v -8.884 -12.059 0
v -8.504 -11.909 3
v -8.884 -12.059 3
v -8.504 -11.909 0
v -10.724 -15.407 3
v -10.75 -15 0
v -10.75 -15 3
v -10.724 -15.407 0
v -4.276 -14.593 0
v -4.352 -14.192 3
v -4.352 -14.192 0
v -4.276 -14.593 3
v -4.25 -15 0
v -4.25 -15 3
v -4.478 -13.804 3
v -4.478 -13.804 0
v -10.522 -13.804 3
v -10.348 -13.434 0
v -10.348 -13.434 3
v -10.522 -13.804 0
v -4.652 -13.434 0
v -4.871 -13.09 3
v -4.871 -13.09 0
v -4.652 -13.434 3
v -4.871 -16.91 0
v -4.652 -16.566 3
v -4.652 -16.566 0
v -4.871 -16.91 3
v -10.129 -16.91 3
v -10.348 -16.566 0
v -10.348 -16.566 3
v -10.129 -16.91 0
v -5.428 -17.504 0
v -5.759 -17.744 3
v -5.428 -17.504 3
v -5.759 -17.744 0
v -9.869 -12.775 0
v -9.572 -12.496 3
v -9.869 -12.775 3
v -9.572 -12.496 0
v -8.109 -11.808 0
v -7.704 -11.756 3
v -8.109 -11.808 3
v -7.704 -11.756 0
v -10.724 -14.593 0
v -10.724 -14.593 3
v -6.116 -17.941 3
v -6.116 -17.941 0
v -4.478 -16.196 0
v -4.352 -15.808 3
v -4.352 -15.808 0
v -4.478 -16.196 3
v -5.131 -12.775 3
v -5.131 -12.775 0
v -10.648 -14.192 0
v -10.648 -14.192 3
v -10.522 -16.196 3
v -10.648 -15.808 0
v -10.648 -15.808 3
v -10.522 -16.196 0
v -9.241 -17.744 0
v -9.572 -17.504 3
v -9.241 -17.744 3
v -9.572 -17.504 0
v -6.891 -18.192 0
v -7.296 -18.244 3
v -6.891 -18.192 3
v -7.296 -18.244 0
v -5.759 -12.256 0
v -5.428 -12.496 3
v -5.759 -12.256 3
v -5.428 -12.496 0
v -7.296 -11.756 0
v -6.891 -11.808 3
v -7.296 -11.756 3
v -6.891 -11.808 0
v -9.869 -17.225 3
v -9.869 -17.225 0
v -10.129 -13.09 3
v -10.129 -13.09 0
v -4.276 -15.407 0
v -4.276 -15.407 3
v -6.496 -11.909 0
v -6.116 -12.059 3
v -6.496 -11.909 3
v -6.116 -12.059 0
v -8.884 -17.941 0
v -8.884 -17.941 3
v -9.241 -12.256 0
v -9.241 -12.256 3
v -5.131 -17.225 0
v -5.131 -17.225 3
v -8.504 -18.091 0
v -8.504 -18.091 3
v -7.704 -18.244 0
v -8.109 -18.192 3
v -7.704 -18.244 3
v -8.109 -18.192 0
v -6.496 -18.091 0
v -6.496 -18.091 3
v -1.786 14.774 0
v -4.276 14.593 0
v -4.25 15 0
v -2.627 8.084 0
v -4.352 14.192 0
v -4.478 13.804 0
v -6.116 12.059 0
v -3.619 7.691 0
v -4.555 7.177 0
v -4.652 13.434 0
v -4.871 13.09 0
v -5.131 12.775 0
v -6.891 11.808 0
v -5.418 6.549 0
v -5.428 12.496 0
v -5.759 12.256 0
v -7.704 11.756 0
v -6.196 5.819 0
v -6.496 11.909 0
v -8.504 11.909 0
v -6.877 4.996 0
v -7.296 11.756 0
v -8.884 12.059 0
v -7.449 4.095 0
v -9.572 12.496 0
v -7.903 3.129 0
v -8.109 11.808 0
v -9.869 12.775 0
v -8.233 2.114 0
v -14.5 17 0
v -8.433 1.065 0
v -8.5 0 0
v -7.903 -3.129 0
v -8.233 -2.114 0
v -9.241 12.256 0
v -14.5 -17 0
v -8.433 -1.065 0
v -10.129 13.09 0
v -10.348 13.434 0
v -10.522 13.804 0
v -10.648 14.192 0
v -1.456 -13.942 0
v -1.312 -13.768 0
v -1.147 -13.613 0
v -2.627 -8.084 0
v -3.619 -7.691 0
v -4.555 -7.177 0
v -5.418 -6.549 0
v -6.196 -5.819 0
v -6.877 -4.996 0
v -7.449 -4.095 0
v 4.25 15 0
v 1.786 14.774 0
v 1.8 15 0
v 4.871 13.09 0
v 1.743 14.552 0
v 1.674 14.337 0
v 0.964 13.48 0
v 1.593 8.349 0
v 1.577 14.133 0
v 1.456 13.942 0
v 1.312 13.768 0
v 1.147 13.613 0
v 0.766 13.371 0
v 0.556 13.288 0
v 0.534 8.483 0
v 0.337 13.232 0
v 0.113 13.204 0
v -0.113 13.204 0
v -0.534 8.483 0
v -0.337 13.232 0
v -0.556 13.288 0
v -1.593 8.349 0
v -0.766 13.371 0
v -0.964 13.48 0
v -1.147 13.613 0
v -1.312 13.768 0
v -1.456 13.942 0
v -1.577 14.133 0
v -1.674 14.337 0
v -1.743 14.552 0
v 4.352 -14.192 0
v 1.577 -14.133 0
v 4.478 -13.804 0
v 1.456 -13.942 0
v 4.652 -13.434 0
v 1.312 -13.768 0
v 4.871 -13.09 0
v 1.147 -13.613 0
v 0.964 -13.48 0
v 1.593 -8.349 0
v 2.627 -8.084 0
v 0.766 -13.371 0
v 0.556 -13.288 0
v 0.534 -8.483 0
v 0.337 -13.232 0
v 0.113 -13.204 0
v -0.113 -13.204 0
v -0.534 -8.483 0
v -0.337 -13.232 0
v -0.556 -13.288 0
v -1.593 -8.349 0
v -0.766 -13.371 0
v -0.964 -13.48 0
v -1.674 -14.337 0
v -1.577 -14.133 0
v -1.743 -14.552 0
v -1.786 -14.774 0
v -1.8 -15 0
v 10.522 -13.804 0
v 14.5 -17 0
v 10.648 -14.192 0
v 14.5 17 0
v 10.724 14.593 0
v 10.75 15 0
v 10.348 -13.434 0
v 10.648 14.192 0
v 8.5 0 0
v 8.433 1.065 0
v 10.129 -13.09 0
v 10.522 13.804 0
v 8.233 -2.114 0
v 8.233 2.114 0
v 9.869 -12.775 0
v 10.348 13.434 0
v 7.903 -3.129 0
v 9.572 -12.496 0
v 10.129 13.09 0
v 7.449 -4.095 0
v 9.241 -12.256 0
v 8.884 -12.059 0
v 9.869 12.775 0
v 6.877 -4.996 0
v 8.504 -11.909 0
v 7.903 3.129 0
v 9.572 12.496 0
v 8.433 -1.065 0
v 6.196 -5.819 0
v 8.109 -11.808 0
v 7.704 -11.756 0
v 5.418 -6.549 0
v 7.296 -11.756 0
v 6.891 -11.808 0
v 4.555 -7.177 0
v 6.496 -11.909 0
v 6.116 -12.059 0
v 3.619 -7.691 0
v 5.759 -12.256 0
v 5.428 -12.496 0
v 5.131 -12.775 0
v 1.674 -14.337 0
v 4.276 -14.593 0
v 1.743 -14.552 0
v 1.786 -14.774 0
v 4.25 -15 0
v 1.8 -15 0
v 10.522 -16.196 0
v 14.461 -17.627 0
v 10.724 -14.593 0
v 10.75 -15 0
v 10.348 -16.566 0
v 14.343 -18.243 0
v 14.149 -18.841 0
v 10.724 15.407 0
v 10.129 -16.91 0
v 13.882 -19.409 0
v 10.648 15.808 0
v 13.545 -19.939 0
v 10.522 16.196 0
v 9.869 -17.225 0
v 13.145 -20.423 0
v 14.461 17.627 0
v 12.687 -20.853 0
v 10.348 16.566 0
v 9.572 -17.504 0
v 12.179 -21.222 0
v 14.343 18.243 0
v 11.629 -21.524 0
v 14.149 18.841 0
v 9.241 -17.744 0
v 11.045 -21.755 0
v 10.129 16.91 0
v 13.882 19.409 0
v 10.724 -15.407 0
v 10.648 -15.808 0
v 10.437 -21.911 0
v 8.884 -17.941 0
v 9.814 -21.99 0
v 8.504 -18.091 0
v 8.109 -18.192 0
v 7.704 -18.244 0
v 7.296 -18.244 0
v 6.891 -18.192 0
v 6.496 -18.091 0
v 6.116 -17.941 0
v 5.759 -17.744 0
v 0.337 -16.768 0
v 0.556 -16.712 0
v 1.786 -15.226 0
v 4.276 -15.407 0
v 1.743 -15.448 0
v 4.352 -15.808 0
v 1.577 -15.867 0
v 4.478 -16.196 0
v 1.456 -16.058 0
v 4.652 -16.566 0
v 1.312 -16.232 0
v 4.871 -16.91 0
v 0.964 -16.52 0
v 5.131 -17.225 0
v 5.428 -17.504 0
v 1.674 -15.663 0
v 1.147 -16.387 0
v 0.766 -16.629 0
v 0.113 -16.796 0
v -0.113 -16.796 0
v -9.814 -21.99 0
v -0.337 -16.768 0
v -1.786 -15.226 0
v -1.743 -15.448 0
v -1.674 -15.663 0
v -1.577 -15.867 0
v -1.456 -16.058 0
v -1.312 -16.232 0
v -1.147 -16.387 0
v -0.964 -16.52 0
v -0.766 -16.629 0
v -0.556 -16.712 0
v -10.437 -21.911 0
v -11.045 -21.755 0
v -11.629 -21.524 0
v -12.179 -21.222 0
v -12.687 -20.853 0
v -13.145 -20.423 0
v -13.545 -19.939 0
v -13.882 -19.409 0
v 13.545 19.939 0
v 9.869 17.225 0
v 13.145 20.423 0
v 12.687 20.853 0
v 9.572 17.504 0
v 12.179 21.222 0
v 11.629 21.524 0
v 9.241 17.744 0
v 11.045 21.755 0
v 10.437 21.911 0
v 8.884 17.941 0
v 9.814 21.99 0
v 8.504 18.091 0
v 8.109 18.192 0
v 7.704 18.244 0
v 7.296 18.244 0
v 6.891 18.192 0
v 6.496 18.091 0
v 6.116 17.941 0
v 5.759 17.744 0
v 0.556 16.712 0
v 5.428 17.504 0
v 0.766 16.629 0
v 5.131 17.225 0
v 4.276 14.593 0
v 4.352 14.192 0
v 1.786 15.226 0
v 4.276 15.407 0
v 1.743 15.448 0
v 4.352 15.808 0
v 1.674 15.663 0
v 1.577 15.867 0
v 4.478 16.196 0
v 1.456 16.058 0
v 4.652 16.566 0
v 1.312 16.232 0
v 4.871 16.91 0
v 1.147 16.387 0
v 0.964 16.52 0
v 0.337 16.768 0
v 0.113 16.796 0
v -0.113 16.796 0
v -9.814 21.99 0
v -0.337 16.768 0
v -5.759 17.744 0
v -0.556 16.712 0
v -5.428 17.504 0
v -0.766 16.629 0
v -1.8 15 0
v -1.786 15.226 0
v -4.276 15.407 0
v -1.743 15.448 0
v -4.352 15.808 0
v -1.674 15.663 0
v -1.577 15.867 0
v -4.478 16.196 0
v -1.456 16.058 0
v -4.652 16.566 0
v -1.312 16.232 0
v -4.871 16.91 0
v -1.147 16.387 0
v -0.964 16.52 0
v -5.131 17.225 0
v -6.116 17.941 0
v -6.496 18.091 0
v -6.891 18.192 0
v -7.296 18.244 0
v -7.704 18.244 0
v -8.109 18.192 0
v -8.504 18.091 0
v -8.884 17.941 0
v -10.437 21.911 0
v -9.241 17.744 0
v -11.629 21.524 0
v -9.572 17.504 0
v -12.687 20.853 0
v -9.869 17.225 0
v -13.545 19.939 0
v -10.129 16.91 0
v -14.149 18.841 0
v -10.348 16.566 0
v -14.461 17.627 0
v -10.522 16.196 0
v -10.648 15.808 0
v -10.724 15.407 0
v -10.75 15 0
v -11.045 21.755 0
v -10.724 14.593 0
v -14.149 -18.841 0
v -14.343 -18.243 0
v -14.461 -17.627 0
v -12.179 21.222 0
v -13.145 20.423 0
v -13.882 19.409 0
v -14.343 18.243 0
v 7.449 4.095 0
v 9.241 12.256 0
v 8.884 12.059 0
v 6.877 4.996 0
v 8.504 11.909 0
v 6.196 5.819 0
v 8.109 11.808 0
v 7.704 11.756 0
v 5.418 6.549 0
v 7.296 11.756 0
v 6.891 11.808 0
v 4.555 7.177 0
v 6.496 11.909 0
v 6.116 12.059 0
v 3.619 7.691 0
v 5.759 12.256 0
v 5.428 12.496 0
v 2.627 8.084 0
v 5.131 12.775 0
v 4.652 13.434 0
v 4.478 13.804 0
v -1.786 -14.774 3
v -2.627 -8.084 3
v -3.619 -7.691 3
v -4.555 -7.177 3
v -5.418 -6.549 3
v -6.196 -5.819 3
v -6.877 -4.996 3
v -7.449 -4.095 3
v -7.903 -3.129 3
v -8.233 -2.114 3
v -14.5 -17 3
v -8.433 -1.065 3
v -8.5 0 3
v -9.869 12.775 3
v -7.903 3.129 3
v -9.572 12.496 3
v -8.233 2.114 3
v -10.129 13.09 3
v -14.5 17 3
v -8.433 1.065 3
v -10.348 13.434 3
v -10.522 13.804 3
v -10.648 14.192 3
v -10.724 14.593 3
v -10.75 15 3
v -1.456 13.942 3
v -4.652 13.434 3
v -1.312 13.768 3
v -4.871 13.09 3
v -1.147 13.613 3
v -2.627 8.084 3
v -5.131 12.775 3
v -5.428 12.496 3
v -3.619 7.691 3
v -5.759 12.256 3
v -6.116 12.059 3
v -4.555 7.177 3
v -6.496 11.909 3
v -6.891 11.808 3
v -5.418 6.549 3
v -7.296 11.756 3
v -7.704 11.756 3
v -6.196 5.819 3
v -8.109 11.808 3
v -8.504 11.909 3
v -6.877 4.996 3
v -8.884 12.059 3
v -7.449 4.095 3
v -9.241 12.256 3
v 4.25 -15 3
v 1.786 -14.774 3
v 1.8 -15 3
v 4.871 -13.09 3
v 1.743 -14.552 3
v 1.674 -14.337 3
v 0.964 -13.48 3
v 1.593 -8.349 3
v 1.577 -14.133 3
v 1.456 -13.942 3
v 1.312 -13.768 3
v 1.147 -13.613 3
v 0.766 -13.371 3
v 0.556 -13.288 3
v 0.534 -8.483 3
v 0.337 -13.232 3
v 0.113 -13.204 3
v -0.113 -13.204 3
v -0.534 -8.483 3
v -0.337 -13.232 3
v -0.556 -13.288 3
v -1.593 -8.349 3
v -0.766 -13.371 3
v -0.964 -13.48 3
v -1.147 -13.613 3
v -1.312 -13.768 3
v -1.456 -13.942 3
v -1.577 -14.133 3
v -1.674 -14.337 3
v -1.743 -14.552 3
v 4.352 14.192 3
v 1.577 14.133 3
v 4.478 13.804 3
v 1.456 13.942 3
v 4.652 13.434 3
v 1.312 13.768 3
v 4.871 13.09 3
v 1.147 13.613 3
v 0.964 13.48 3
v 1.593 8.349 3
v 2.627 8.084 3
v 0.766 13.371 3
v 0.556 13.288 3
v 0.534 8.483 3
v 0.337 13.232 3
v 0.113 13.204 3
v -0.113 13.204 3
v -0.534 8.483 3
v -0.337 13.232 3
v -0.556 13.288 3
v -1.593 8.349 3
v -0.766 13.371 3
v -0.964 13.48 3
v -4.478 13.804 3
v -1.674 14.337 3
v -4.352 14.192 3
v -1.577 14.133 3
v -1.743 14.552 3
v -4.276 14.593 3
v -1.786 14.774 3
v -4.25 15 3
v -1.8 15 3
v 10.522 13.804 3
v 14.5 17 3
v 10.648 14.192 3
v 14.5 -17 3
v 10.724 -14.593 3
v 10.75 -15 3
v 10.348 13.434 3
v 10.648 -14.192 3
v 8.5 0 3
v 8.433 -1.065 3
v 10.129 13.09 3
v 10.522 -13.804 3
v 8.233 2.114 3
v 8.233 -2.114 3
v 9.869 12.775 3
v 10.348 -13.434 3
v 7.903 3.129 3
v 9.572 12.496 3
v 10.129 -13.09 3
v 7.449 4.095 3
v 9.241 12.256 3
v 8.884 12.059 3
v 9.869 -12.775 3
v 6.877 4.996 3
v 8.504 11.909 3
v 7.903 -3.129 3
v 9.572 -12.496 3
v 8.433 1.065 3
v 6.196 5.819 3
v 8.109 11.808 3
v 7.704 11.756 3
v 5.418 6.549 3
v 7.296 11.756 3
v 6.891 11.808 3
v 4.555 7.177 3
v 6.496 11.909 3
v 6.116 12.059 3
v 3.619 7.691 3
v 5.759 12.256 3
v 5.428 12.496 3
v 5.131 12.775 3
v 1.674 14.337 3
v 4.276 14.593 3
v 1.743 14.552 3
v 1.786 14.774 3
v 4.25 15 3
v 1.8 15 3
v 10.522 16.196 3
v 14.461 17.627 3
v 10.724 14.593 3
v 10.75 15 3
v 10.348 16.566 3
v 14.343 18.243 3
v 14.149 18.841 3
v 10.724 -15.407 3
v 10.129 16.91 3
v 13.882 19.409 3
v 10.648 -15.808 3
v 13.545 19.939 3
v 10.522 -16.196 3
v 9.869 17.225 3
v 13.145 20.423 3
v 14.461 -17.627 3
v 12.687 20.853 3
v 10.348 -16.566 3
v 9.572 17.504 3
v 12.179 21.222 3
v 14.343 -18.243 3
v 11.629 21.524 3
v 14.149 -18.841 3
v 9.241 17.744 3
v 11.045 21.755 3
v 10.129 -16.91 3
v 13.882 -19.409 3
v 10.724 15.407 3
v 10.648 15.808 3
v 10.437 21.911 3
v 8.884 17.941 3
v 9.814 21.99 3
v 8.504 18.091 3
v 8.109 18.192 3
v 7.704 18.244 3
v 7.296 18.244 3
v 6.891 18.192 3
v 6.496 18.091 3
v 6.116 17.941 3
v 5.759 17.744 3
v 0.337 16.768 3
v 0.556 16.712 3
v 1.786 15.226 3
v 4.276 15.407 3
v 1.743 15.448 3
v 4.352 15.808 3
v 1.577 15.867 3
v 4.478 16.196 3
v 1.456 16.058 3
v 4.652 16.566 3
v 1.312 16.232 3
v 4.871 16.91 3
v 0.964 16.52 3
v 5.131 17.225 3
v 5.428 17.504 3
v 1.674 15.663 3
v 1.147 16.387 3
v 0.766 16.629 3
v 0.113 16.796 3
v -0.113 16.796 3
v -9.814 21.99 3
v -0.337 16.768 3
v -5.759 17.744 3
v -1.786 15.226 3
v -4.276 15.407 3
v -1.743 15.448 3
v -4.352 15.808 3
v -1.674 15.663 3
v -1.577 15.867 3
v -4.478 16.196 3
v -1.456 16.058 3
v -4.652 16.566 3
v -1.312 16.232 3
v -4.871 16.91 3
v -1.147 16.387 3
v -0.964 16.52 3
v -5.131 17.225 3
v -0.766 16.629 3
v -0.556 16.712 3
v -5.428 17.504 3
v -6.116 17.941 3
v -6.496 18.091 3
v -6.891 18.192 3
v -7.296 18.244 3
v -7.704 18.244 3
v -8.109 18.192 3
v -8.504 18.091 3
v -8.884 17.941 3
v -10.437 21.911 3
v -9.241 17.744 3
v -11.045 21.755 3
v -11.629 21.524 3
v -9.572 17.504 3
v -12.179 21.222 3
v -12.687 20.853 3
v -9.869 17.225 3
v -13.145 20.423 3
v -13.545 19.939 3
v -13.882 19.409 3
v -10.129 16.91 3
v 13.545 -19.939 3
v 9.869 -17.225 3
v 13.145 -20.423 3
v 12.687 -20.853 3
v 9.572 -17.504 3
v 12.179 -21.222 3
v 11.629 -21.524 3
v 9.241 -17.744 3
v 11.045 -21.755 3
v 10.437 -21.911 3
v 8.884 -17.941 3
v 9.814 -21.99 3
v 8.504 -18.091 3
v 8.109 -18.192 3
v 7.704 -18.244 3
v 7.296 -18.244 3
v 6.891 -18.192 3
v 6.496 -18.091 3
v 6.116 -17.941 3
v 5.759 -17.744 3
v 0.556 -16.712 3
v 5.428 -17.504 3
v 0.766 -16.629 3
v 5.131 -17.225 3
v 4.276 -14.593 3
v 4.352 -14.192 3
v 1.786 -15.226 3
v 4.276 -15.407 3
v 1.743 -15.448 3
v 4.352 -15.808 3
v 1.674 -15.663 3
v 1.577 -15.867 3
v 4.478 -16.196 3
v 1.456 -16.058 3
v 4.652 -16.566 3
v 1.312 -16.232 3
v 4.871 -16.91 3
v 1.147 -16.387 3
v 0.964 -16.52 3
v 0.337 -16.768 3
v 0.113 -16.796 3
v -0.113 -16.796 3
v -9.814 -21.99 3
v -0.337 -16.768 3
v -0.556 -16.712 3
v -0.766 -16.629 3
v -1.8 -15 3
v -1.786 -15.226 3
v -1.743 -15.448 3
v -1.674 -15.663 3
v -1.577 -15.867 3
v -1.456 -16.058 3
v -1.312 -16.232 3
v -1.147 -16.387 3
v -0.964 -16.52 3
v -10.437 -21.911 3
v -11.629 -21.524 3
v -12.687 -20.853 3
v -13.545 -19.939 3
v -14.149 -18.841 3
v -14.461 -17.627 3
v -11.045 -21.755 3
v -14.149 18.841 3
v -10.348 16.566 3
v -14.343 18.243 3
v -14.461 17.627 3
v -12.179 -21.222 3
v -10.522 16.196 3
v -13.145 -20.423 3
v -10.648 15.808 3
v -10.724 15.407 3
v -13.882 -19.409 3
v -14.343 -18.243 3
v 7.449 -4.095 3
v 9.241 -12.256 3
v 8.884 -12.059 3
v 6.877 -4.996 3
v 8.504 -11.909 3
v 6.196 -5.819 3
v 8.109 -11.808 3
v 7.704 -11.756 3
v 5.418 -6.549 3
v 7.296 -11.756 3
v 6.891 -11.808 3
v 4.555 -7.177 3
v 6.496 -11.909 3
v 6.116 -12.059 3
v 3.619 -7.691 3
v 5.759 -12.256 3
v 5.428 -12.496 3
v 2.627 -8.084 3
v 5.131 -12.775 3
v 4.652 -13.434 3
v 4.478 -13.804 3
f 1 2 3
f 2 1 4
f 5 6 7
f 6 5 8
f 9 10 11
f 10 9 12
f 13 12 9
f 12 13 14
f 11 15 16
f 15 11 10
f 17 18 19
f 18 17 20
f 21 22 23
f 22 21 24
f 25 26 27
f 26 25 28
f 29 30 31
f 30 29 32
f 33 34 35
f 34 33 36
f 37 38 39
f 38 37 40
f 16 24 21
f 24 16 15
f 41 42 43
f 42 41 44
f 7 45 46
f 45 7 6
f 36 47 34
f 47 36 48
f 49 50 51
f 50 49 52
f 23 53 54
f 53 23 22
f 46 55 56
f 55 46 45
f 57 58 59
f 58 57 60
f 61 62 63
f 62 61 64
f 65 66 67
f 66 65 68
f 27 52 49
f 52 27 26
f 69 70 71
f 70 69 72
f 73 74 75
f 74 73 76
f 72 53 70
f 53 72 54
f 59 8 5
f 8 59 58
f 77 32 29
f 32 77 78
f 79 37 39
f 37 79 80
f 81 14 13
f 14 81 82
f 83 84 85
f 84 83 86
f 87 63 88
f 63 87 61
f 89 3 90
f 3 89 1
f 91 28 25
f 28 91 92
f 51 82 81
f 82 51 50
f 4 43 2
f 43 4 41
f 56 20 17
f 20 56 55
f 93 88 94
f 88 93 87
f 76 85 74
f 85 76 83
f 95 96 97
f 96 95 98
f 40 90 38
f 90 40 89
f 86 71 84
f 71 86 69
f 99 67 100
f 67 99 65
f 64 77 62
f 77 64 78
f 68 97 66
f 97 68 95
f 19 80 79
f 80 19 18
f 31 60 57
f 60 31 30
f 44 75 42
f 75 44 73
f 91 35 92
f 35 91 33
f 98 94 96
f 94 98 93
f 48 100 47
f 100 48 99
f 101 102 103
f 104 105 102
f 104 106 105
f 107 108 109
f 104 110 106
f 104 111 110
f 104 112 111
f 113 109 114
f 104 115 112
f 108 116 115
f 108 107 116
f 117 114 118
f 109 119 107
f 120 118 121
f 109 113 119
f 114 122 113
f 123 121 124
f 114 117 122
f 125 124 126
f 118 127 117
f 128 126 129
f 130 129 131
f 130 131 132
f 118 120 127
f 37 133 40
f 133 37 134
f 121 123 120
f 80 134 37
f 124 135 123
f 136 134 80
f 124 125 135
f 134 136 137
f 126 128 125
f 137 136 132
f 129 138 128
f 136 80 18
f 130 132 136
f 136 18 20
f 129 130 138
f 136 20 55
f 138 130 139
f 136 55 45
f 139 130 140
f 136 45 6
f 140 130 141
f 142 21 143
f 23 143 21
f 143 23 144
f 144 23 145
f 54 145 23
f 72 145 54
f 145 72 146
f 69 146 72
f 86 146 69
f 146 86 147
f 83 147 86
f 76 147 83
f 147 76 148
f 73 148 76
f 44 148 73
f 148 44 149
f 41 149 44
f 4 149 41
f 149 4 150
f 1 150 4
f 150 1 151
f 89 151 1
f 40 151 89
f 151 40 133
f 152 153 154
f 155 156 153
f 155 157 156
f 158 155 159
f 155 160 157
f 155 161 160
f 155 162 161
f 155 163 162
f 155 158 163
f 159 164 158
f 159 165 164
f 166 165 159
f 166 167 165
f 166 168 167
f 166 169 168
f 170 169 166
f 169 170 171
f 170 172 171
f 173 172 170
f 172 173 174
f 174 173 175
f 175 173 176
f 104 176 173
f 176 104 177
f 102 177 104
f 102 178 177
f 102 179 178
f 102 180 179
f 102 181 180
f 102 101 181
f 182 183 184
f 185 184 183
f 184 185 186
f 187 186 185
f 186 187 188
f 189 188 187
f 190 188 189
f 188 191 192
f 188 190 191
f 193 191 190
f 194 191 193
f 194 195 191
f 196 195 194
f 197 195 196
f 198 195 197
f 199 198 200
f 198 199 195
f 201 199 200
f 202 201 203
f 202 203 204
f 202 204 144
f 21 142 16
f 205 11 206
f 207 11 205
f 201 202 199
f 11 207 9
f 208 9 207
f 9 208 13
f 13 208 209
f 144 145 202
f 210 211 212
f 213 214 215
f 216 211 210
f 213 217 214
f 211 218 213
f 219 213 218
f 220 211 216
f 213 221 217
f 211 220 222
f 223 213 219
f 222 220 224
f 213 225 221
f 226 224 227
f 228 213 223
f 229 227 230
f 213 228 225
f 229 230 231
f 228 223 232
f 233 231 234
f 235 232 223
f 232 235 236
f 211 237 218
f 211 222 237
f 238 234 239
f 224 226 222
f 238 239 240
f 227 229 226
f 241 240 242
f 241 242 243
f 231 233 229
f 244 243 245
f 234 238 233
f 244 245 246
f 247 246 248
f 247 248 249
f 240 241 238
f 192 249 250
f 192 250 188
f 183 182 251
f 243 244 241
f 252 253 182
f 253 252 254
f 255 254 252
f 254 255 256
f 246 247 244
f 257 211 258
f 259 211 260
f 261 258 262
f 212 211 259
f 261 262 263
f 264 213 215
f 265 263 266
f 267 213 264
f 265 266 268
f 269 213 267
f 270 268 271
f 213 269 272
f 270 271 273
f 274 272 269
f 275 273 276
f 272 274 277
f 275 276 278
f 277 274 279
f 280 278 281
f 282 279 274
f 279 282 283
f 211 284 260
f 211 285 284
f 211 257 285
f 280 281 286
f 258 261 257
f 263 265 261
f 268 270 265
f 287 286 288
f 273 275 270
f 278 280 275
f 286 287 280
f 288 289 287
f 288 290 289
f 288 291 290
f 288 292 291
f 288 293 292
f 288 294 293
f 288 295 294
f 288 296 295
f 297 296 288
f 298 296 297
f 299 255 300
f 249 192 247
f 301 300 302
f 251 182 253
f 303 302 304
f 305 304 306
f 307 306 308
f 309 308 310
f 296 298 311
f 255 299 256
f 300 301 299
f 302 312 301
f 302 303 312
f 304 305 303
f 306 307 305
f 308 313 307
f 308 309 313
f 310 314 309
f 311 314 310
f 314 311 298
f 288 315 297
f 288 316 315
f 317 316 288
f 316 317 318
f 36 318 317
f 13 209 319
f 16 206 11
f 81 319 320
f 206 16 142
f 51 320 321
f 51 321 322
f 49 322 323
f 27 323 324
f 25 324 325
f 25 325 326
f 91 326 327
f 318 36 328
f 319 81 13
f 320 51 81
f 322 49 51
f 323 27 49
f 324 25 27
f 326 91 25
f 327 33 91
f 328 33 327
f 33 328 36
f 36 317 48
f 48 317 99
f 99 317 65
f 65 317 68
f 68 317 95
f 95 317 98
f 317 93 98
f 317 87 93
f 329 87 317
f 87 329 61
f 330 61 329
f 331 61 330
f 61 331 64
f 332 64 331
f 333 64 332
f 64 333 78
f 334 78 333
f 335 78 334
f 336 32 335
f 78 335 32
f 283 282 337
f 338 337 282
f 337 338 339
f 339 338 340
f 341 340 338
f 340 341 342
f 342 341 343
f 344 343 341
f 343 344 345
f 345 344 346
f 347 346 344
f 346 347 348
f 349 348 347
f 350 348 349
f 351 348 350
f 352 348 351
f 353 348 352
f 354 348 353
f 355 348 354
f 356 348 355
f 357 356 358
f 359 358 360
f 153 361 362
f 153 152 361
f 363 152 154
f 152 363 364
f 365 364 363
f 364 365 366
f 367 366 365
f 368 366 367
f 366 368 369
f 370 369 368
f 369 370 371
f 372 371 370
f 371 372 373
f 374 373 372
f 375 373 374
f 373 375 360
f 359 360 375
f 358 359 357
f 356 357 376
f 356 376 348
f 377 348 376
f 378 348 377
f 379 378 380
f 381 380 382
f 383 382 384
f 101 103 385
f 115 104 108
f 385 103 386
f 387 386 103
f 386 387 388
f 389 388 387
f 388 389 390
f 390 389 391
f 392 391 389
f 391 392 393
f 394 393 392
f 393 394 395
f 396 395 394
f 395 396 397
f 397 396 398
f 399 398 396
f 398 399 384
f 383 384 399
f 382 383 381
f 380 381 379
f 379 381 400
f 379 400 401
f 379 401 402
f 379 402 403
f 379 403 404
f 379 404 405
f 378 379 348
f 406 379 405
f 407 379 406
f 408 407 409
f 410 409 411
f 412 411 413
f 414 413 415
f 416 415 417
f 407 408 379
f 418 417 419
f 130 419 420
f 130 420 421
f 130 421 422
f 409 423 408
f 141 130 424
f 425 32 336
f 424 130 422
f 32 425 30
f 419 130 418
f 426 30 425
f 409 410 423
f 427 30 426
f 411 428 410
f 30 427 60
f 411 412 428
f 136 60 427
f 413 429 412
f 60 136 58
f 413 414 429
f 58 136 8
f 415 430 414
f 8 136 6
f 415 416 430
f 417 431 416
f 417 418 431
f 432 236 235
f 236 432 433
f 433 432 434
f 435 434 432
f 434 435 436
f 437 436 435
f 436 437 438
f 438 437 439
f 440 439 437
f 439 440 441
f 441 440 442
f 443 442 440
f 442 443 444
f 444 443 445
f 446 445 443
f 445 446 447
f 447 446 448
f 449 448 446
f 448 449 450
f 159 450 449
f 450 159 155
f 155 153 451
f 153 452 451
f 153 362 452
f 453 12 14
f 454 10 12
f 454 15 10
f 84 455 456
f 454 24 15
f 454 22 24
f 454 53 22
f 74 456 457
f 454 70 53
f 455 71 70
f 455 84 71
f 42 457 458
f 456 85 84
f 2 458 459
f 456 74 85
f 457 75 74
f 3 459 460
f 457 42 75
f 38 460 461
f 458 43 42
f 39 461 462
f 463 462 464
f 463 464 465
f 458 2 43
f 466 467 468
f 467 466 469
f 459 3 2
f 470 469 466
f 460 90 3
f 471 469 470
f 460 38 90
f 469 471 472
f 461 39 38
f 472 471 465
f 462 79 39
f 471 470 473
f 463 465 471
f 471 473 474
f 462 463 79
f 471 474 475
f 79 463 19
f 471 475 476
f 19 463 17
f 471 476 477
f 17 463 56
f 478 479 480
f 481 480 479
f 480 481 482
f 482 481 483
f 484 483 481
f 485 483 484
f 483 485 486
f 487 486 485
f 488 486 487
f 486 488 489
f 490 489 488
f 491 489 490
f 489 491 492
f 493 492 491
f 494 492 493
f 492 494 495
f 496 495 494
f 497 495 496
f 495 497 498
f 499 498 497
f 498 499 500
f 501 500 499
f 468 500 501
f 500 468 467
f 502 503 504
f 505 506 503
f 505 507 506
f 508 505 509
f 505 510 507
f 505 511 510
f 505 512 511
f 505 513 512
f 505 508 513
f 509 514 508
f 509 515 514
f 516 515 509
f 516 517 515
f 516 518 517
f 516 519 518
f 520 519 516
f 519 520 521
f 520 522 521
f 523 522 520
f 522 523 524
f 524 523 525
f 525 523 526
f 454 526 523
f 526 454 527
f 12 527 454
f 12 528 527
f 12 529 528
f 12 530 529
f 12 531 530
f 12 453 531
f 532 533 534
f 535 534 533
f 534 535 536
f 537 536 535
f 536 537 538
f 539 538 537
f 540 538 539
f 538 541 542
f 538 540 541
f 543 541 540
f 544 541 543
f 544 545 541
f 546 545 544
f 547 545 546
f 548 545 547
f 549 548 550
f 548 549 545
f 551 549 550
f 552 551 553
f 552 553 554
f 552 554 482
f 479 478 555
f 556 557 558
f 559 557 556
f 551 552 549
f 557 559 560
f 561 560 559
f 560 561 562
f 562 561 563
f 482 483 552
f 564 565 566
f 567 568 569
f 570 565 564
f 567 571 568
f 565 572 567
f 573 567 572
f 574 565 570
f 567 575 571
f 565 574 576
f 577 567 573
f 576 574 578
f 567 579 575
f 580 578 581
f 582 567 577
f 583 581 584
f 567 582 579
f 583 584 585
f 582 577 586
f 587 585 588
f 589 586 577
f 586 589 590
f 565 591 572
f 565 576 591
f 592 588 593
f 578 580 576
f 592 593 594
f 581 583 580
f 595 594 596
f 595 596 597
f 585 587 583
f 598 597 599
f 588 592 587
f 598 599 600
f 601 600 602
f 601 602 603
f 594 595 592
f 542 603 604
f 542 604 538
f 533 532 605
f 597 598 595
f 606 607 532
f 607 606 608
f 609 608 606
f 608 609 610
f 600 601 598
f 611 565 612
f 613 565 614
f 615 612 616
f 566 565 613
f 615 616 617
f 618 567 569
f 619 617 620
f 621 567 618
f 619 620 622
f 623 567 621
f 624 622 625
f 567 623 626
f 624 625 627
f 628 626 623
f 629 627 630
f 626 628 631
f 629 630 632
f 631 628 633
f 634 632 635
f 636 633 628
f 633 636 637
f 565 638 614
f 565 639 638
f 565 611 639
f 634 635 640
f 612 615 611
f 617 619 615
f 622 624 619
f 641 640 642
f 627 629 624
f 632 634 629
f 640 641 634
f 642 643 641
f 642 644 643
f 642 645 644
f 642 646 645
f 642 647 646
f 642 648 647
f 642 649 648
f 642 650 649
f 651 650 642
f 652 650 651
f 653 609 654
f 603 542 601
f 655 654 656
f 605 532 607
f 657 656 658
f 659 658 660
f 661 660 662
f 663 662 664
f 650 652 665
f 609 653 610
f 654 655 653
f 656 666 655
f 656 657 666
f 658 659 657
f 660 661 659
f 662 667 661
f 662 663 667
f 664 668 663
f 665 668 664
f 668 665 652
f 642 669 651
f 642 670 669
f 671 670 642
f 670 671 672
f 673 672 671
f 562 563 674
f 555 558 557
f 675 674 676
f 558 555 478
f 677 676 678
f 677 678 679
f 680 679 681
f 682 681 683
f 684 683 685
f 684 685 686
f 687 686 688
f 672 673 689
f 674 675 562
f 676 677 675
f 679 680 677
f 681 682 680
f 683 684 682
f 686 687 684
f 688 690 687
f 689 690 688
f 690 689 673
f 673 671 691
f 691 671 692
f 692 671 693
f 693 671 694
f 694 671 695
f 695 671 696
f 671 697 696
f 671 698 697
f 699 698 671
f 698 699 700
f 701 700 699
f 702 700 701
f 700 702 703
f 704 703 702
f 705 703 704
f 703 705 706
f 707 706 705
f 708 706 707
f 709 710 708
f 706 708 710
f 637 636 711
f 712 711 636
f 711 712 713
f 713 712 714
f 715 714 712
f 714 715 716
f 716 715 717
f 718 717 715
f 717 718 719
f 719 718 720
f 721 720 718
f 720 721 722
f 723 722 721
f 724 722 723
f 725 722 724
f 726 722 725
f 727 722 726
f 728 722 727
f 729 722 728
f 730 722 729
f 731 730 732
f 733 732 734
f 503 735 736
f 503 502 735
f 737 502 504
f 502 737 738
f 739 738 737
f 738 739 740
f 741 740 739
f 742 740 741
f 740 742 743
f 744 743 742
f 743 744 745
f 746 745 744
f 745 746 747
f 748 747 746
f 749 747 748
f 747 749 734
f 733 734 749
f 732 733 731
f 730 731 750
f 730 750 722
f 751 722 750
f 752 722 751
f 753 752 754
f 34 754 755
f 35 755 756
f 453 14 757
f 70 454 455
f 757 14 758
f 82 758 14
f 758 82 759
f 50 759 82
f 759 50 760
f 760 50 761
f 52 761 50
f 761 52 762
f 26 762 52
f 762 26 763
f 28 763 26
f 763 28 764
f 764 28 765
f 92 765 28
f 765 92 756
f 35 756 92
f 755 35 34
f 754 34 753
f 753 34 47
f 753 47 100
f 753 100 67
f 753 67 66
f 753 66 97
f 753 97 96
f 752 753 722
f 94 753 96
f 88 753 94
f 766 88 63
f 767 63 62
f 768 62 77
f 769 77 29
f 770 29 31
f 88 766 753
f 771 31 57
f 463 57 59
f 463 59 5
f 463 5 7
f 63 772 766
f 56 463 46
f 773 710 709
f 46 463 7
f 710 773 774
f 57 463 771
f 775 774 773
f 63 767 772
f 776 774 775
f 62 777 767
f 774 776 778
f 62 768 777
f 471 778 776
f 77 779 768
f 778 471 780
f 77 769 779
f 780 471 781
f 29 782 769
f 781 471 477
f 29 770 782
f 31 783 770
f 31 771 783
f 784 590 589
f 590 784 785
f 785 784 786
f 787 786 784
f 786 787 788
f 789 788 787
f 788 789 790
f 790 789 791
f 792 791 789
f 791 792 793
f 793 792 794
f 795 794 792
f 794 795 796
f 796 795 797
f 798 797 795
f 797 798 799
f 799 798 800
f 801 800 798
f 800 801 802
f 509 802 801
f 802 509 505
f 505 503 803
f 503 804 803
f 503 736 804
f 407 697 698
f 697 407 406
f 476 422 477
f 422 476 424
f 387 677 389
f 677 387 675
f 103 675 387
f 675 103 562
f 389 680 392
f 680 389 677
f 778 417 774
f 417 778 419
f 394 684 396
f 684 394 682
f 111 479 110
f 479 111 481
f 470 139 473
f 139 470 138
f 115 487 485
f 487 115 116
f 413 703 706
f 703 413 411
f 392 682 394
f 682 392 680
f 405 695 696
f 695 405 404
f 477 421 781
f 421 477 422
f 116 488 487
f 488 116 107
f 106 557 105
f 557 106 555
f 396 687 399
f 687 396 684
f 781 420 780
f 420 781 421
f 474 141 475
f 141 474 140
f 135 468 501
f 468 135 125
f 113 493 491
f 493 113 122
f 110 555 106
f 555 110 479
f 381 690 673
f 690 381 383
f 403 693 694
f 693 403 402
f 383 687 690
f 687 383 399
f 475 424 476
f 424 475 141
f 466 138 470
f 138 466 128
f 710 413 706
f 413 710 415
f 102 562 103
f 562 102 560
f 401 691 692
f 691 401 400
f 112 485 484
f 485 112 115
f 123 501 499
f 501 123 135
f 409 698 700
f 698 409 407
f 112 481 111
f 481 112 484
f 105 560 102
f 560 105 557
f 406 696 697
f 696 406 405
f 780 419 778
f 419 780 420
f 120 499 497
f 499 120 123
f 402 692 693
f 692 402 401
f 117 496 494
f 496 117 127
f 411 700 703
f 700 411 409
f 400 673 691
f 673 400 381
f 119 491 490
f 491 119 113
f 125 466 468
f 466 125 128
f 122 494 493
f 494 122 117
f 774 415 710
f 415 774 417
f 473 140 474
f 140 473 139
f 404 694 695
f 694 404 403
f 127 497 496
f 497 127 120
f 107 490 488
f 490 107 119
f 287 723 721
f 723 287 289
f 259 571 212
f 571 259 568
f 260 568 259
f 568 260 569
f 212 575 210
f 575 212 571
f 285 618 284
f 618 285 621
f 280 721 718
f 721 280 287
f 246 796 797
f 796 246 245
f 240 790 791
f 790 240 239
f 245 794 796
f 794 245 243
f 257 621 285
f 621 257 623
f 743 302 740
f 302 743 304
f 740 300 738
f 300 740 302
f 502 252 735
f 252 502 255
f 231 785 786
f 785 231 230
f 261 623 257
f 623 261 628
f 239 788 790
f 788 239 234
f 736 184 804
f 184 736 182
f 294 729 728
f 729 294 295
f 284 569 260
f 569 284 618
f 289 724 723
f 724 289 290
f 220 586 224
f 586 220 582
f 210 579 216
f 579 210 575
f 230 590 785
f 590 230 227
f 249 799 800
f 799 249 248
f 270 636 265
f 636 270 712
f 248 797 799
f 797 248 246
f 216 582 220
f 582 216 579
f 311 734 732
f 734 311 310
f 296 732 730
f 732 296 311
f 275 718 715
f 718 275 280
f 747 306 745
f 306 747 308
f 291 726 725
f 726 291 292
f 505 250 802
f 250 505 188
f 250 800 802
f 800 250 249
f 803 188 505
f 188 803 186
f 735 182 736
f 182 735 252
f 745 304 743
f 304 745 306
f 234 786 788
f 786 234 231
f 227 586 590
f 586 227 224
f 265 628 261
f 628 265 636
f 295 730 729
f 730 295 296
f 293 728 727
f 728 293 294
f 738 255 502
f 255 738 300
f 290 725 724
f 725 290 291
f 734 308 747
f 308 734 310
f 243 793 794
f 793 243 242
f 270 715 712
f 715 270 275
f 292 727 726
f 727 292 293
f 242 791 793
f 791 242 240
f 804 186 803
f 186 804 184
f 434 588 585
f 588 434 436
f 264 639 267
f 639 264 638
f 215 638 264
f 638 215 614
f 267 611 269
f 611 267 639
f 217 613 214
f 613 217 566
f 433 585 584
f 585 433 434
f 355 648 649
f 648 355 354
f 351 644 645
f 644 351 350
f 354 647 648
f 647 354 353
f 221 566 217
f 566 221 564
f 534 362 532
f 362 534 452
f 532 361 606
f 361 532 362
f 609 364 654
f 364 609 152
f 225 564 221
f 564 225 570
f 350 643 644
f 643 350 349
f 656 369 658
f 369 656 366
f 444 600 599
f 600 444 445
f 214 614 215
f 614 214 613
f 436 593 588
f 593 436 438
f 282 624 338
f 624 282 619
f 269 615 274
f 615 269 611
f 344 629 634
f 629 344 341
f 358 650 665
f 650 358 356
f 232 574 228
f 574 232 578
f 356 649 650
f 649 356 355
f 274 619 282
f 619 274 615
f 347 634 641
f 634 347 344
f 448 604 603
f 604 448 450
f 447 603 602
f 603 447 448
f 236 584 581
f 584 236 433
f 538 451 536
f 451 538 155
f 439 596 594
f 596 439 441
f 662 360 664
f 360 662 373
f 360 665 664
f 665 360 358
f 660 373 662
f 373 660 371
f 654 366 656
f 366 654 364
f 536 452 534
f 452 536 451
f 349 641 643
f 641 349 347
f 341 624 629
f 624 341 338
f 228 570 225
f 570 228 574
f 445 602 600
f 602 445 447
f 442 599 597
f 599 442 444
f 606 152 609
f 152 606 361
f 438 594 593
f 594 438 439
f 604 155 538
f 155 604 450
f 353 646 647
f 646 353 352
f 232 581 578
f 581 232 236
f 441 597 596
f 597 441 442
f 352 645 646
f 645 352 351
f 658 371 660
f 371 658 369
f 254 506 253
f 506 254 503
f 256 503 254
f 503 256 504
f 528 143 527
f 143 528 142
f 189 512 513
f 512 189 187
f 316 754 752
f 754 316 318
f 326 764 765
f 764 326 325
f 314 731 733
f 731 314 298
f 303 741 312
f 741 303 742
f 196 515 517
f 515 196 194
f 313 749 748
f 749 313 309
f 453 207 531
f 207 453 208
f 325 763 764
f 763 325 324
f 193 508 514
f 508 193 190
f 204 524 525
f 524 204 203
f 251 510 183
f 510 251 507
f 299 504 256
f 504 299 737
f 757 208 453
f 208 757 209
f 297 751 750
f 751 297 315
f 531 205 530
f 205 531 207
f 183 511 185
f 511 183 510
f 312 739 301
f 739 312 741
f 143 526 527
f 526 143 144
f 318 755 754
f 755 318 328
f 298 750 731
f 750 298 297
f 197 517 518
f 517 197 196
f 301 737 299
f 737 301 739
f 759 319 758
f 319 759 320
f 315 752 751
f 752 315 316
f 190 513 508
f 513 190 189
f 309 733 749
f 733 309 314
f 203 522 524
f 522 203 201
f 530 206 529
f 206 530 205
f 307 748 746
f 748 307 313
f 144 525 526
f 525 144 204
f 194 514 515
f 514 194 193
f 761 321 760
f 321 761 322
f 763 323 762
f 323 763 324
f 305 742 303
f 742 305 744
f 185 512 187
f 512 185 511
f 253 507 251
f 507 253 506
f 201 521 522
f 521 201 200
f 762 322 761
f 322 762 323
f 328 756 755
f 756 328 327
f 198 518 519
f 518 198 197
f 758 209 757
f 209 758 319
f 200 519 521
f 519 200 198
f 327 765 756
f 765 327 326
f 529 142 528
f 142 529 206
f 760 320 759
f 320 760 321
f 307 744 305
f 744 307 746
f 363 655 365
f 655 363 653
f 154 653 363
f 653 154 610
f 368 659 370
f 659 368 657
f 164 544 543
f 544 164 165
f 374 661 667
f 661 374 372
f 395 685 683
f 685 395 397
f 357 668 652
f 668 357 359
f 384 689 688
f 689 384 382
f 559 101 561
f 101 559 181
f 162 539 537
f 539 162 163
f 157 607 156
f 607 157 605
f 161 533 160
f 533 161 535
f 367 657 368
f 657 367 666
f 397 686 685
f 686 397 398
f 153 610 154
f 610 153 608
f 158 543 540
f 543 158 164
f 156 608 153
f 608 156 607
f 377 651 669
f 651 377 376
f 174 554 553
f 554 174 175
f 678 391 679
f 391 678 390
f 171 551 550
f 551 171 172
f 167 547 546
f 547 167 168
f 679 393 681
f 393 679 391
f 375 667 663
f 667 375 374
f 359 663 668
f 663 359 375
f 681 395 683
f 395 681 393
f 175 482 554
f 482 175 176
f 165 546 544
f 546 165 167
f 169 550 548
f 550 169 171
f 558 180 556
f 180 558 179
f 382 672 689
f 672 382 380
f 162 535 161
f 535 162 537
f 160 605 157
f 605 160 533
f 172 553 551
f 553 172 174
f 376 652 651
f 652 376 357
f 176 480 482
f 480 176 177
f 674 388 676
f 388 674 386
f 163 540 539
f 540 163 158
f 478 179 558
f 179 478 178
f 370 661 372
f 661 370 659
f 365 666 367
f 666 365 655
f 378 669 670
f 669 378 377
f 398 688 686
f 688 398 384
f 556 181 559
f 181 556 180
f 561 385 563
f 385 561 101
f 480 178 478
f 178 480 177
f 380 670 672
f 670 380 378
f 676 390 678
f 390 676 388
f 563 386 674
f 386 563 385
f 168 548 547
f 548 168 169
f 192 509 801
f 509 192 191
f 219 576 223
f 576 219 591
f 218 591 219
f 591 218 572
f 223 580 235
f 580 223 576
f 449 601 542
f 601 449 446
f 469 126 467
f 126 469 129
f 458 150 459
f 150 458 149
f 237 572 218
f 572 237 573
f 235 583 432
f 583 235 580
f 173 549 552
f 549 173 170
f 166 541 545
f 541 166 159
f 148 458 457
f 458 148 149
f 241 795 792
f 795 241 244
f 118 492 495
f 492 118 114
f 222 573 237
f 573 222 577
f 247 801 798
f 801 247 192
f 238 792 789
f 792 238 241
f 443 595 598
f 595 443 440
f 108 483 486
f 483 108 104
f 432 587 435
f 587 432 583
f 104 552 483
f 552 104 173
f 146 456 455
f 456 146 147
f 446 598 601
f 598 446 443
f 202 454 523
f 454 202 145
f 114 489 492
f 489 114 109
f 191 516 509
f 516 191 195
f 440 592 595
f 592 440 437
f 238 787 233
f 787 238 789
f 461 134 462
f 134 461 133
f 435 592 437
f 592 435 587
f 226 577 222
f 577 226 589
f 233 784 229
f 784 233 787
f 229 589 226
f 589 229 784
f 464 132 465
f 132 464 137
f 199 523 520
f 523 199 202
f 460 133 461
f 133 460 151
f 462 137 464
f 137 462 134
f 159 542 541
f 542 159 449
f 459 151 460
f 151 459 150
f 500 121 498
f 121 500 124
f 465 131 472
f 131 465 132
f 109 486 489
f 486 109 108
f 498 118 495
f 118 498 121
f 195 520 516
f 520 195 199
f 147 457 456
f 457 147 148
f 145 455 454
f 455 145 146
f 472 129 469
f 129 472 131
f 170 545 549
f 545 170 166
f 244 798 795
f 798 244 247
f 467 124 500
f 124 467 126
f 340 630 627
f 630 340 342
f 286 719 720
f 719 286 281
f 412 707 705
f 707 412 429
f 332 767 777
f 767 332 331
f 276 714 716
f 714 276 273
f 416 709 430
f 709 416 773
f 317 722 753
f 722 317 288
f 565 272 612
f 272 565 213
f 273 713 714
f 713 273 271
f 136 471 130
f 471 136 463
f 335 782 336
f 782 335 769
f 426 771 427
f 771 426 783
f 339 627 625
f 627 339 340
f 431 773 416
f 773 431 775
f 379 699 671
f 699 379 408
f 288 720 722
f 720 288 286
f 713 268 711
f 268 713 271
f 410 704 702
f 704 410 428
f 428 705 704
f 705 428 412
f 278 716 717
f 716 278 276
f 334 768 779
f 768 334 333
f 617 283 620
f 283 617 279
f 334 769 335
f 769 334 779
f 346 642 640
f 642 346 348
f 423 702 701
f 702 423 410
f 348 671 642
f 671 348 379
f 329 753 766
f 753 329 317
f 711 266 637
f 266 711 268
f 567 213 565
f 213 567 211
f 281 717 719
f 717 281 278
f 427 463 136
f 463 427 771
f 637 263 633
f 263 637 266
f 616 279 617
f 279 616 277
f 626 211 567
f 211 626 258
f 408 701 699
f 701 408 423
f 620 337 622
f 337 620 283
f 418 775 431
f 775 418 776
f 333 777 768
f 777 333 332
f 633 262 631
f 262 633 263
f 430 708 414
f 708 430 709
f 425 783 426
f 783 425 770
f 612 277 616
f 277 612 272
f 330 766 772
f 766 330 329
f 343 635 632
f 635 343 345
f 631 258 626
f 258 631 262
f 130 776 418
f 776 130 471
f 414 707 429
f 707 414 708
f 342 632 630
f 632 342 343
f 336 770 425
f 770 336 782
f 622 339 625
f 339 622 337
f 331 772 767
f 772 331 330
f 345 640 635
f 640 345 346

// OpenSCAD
$fn = 50;

difference() {
	union() {
		hull() {
			translate(v = [-9.5, 17.0, 0]) {
				cylinder(h = 3, r = 5);
			}
			translate(v = [9.5, 17.0, 0]) {
				cylinder(h = 3, r = 5);
			}
			translate(v = [-9.5, -17.0, 0]) {
				cylinder(h = 3, r = 5);
			}
			translate(v = [9.5, -17.0, 0]) {
				cylinder(h = 3, r = 5);
			}
		}
	}
	union() {
		translate(v = [-7.5, -15.0, 0]) {
			cylinder(h = 3, r = 3.25);
		}
		translate(v = [-7.5, 15.0, 0]) {
			cylinder(h = 3, r = 3.25);
		}
		translate(v = [7.5, -15.0, 0]) {
			cylinder(h = 3, r = 3.25);
		}
		translate(v = [7.5, 15.0, 0]) {
			cylinder(h = 3, r = 3.25);
		}
		translate(v = [0.0, -15.0, 0]) {
			cylinder(h = 3, r = 1.8);
		}
		translate(v = [0.0, 15.0, 0]) {
			cylinder(h = 3, r = 1.8);
		}
		cylinder(h = 3, r = 8.5);
	}
}
